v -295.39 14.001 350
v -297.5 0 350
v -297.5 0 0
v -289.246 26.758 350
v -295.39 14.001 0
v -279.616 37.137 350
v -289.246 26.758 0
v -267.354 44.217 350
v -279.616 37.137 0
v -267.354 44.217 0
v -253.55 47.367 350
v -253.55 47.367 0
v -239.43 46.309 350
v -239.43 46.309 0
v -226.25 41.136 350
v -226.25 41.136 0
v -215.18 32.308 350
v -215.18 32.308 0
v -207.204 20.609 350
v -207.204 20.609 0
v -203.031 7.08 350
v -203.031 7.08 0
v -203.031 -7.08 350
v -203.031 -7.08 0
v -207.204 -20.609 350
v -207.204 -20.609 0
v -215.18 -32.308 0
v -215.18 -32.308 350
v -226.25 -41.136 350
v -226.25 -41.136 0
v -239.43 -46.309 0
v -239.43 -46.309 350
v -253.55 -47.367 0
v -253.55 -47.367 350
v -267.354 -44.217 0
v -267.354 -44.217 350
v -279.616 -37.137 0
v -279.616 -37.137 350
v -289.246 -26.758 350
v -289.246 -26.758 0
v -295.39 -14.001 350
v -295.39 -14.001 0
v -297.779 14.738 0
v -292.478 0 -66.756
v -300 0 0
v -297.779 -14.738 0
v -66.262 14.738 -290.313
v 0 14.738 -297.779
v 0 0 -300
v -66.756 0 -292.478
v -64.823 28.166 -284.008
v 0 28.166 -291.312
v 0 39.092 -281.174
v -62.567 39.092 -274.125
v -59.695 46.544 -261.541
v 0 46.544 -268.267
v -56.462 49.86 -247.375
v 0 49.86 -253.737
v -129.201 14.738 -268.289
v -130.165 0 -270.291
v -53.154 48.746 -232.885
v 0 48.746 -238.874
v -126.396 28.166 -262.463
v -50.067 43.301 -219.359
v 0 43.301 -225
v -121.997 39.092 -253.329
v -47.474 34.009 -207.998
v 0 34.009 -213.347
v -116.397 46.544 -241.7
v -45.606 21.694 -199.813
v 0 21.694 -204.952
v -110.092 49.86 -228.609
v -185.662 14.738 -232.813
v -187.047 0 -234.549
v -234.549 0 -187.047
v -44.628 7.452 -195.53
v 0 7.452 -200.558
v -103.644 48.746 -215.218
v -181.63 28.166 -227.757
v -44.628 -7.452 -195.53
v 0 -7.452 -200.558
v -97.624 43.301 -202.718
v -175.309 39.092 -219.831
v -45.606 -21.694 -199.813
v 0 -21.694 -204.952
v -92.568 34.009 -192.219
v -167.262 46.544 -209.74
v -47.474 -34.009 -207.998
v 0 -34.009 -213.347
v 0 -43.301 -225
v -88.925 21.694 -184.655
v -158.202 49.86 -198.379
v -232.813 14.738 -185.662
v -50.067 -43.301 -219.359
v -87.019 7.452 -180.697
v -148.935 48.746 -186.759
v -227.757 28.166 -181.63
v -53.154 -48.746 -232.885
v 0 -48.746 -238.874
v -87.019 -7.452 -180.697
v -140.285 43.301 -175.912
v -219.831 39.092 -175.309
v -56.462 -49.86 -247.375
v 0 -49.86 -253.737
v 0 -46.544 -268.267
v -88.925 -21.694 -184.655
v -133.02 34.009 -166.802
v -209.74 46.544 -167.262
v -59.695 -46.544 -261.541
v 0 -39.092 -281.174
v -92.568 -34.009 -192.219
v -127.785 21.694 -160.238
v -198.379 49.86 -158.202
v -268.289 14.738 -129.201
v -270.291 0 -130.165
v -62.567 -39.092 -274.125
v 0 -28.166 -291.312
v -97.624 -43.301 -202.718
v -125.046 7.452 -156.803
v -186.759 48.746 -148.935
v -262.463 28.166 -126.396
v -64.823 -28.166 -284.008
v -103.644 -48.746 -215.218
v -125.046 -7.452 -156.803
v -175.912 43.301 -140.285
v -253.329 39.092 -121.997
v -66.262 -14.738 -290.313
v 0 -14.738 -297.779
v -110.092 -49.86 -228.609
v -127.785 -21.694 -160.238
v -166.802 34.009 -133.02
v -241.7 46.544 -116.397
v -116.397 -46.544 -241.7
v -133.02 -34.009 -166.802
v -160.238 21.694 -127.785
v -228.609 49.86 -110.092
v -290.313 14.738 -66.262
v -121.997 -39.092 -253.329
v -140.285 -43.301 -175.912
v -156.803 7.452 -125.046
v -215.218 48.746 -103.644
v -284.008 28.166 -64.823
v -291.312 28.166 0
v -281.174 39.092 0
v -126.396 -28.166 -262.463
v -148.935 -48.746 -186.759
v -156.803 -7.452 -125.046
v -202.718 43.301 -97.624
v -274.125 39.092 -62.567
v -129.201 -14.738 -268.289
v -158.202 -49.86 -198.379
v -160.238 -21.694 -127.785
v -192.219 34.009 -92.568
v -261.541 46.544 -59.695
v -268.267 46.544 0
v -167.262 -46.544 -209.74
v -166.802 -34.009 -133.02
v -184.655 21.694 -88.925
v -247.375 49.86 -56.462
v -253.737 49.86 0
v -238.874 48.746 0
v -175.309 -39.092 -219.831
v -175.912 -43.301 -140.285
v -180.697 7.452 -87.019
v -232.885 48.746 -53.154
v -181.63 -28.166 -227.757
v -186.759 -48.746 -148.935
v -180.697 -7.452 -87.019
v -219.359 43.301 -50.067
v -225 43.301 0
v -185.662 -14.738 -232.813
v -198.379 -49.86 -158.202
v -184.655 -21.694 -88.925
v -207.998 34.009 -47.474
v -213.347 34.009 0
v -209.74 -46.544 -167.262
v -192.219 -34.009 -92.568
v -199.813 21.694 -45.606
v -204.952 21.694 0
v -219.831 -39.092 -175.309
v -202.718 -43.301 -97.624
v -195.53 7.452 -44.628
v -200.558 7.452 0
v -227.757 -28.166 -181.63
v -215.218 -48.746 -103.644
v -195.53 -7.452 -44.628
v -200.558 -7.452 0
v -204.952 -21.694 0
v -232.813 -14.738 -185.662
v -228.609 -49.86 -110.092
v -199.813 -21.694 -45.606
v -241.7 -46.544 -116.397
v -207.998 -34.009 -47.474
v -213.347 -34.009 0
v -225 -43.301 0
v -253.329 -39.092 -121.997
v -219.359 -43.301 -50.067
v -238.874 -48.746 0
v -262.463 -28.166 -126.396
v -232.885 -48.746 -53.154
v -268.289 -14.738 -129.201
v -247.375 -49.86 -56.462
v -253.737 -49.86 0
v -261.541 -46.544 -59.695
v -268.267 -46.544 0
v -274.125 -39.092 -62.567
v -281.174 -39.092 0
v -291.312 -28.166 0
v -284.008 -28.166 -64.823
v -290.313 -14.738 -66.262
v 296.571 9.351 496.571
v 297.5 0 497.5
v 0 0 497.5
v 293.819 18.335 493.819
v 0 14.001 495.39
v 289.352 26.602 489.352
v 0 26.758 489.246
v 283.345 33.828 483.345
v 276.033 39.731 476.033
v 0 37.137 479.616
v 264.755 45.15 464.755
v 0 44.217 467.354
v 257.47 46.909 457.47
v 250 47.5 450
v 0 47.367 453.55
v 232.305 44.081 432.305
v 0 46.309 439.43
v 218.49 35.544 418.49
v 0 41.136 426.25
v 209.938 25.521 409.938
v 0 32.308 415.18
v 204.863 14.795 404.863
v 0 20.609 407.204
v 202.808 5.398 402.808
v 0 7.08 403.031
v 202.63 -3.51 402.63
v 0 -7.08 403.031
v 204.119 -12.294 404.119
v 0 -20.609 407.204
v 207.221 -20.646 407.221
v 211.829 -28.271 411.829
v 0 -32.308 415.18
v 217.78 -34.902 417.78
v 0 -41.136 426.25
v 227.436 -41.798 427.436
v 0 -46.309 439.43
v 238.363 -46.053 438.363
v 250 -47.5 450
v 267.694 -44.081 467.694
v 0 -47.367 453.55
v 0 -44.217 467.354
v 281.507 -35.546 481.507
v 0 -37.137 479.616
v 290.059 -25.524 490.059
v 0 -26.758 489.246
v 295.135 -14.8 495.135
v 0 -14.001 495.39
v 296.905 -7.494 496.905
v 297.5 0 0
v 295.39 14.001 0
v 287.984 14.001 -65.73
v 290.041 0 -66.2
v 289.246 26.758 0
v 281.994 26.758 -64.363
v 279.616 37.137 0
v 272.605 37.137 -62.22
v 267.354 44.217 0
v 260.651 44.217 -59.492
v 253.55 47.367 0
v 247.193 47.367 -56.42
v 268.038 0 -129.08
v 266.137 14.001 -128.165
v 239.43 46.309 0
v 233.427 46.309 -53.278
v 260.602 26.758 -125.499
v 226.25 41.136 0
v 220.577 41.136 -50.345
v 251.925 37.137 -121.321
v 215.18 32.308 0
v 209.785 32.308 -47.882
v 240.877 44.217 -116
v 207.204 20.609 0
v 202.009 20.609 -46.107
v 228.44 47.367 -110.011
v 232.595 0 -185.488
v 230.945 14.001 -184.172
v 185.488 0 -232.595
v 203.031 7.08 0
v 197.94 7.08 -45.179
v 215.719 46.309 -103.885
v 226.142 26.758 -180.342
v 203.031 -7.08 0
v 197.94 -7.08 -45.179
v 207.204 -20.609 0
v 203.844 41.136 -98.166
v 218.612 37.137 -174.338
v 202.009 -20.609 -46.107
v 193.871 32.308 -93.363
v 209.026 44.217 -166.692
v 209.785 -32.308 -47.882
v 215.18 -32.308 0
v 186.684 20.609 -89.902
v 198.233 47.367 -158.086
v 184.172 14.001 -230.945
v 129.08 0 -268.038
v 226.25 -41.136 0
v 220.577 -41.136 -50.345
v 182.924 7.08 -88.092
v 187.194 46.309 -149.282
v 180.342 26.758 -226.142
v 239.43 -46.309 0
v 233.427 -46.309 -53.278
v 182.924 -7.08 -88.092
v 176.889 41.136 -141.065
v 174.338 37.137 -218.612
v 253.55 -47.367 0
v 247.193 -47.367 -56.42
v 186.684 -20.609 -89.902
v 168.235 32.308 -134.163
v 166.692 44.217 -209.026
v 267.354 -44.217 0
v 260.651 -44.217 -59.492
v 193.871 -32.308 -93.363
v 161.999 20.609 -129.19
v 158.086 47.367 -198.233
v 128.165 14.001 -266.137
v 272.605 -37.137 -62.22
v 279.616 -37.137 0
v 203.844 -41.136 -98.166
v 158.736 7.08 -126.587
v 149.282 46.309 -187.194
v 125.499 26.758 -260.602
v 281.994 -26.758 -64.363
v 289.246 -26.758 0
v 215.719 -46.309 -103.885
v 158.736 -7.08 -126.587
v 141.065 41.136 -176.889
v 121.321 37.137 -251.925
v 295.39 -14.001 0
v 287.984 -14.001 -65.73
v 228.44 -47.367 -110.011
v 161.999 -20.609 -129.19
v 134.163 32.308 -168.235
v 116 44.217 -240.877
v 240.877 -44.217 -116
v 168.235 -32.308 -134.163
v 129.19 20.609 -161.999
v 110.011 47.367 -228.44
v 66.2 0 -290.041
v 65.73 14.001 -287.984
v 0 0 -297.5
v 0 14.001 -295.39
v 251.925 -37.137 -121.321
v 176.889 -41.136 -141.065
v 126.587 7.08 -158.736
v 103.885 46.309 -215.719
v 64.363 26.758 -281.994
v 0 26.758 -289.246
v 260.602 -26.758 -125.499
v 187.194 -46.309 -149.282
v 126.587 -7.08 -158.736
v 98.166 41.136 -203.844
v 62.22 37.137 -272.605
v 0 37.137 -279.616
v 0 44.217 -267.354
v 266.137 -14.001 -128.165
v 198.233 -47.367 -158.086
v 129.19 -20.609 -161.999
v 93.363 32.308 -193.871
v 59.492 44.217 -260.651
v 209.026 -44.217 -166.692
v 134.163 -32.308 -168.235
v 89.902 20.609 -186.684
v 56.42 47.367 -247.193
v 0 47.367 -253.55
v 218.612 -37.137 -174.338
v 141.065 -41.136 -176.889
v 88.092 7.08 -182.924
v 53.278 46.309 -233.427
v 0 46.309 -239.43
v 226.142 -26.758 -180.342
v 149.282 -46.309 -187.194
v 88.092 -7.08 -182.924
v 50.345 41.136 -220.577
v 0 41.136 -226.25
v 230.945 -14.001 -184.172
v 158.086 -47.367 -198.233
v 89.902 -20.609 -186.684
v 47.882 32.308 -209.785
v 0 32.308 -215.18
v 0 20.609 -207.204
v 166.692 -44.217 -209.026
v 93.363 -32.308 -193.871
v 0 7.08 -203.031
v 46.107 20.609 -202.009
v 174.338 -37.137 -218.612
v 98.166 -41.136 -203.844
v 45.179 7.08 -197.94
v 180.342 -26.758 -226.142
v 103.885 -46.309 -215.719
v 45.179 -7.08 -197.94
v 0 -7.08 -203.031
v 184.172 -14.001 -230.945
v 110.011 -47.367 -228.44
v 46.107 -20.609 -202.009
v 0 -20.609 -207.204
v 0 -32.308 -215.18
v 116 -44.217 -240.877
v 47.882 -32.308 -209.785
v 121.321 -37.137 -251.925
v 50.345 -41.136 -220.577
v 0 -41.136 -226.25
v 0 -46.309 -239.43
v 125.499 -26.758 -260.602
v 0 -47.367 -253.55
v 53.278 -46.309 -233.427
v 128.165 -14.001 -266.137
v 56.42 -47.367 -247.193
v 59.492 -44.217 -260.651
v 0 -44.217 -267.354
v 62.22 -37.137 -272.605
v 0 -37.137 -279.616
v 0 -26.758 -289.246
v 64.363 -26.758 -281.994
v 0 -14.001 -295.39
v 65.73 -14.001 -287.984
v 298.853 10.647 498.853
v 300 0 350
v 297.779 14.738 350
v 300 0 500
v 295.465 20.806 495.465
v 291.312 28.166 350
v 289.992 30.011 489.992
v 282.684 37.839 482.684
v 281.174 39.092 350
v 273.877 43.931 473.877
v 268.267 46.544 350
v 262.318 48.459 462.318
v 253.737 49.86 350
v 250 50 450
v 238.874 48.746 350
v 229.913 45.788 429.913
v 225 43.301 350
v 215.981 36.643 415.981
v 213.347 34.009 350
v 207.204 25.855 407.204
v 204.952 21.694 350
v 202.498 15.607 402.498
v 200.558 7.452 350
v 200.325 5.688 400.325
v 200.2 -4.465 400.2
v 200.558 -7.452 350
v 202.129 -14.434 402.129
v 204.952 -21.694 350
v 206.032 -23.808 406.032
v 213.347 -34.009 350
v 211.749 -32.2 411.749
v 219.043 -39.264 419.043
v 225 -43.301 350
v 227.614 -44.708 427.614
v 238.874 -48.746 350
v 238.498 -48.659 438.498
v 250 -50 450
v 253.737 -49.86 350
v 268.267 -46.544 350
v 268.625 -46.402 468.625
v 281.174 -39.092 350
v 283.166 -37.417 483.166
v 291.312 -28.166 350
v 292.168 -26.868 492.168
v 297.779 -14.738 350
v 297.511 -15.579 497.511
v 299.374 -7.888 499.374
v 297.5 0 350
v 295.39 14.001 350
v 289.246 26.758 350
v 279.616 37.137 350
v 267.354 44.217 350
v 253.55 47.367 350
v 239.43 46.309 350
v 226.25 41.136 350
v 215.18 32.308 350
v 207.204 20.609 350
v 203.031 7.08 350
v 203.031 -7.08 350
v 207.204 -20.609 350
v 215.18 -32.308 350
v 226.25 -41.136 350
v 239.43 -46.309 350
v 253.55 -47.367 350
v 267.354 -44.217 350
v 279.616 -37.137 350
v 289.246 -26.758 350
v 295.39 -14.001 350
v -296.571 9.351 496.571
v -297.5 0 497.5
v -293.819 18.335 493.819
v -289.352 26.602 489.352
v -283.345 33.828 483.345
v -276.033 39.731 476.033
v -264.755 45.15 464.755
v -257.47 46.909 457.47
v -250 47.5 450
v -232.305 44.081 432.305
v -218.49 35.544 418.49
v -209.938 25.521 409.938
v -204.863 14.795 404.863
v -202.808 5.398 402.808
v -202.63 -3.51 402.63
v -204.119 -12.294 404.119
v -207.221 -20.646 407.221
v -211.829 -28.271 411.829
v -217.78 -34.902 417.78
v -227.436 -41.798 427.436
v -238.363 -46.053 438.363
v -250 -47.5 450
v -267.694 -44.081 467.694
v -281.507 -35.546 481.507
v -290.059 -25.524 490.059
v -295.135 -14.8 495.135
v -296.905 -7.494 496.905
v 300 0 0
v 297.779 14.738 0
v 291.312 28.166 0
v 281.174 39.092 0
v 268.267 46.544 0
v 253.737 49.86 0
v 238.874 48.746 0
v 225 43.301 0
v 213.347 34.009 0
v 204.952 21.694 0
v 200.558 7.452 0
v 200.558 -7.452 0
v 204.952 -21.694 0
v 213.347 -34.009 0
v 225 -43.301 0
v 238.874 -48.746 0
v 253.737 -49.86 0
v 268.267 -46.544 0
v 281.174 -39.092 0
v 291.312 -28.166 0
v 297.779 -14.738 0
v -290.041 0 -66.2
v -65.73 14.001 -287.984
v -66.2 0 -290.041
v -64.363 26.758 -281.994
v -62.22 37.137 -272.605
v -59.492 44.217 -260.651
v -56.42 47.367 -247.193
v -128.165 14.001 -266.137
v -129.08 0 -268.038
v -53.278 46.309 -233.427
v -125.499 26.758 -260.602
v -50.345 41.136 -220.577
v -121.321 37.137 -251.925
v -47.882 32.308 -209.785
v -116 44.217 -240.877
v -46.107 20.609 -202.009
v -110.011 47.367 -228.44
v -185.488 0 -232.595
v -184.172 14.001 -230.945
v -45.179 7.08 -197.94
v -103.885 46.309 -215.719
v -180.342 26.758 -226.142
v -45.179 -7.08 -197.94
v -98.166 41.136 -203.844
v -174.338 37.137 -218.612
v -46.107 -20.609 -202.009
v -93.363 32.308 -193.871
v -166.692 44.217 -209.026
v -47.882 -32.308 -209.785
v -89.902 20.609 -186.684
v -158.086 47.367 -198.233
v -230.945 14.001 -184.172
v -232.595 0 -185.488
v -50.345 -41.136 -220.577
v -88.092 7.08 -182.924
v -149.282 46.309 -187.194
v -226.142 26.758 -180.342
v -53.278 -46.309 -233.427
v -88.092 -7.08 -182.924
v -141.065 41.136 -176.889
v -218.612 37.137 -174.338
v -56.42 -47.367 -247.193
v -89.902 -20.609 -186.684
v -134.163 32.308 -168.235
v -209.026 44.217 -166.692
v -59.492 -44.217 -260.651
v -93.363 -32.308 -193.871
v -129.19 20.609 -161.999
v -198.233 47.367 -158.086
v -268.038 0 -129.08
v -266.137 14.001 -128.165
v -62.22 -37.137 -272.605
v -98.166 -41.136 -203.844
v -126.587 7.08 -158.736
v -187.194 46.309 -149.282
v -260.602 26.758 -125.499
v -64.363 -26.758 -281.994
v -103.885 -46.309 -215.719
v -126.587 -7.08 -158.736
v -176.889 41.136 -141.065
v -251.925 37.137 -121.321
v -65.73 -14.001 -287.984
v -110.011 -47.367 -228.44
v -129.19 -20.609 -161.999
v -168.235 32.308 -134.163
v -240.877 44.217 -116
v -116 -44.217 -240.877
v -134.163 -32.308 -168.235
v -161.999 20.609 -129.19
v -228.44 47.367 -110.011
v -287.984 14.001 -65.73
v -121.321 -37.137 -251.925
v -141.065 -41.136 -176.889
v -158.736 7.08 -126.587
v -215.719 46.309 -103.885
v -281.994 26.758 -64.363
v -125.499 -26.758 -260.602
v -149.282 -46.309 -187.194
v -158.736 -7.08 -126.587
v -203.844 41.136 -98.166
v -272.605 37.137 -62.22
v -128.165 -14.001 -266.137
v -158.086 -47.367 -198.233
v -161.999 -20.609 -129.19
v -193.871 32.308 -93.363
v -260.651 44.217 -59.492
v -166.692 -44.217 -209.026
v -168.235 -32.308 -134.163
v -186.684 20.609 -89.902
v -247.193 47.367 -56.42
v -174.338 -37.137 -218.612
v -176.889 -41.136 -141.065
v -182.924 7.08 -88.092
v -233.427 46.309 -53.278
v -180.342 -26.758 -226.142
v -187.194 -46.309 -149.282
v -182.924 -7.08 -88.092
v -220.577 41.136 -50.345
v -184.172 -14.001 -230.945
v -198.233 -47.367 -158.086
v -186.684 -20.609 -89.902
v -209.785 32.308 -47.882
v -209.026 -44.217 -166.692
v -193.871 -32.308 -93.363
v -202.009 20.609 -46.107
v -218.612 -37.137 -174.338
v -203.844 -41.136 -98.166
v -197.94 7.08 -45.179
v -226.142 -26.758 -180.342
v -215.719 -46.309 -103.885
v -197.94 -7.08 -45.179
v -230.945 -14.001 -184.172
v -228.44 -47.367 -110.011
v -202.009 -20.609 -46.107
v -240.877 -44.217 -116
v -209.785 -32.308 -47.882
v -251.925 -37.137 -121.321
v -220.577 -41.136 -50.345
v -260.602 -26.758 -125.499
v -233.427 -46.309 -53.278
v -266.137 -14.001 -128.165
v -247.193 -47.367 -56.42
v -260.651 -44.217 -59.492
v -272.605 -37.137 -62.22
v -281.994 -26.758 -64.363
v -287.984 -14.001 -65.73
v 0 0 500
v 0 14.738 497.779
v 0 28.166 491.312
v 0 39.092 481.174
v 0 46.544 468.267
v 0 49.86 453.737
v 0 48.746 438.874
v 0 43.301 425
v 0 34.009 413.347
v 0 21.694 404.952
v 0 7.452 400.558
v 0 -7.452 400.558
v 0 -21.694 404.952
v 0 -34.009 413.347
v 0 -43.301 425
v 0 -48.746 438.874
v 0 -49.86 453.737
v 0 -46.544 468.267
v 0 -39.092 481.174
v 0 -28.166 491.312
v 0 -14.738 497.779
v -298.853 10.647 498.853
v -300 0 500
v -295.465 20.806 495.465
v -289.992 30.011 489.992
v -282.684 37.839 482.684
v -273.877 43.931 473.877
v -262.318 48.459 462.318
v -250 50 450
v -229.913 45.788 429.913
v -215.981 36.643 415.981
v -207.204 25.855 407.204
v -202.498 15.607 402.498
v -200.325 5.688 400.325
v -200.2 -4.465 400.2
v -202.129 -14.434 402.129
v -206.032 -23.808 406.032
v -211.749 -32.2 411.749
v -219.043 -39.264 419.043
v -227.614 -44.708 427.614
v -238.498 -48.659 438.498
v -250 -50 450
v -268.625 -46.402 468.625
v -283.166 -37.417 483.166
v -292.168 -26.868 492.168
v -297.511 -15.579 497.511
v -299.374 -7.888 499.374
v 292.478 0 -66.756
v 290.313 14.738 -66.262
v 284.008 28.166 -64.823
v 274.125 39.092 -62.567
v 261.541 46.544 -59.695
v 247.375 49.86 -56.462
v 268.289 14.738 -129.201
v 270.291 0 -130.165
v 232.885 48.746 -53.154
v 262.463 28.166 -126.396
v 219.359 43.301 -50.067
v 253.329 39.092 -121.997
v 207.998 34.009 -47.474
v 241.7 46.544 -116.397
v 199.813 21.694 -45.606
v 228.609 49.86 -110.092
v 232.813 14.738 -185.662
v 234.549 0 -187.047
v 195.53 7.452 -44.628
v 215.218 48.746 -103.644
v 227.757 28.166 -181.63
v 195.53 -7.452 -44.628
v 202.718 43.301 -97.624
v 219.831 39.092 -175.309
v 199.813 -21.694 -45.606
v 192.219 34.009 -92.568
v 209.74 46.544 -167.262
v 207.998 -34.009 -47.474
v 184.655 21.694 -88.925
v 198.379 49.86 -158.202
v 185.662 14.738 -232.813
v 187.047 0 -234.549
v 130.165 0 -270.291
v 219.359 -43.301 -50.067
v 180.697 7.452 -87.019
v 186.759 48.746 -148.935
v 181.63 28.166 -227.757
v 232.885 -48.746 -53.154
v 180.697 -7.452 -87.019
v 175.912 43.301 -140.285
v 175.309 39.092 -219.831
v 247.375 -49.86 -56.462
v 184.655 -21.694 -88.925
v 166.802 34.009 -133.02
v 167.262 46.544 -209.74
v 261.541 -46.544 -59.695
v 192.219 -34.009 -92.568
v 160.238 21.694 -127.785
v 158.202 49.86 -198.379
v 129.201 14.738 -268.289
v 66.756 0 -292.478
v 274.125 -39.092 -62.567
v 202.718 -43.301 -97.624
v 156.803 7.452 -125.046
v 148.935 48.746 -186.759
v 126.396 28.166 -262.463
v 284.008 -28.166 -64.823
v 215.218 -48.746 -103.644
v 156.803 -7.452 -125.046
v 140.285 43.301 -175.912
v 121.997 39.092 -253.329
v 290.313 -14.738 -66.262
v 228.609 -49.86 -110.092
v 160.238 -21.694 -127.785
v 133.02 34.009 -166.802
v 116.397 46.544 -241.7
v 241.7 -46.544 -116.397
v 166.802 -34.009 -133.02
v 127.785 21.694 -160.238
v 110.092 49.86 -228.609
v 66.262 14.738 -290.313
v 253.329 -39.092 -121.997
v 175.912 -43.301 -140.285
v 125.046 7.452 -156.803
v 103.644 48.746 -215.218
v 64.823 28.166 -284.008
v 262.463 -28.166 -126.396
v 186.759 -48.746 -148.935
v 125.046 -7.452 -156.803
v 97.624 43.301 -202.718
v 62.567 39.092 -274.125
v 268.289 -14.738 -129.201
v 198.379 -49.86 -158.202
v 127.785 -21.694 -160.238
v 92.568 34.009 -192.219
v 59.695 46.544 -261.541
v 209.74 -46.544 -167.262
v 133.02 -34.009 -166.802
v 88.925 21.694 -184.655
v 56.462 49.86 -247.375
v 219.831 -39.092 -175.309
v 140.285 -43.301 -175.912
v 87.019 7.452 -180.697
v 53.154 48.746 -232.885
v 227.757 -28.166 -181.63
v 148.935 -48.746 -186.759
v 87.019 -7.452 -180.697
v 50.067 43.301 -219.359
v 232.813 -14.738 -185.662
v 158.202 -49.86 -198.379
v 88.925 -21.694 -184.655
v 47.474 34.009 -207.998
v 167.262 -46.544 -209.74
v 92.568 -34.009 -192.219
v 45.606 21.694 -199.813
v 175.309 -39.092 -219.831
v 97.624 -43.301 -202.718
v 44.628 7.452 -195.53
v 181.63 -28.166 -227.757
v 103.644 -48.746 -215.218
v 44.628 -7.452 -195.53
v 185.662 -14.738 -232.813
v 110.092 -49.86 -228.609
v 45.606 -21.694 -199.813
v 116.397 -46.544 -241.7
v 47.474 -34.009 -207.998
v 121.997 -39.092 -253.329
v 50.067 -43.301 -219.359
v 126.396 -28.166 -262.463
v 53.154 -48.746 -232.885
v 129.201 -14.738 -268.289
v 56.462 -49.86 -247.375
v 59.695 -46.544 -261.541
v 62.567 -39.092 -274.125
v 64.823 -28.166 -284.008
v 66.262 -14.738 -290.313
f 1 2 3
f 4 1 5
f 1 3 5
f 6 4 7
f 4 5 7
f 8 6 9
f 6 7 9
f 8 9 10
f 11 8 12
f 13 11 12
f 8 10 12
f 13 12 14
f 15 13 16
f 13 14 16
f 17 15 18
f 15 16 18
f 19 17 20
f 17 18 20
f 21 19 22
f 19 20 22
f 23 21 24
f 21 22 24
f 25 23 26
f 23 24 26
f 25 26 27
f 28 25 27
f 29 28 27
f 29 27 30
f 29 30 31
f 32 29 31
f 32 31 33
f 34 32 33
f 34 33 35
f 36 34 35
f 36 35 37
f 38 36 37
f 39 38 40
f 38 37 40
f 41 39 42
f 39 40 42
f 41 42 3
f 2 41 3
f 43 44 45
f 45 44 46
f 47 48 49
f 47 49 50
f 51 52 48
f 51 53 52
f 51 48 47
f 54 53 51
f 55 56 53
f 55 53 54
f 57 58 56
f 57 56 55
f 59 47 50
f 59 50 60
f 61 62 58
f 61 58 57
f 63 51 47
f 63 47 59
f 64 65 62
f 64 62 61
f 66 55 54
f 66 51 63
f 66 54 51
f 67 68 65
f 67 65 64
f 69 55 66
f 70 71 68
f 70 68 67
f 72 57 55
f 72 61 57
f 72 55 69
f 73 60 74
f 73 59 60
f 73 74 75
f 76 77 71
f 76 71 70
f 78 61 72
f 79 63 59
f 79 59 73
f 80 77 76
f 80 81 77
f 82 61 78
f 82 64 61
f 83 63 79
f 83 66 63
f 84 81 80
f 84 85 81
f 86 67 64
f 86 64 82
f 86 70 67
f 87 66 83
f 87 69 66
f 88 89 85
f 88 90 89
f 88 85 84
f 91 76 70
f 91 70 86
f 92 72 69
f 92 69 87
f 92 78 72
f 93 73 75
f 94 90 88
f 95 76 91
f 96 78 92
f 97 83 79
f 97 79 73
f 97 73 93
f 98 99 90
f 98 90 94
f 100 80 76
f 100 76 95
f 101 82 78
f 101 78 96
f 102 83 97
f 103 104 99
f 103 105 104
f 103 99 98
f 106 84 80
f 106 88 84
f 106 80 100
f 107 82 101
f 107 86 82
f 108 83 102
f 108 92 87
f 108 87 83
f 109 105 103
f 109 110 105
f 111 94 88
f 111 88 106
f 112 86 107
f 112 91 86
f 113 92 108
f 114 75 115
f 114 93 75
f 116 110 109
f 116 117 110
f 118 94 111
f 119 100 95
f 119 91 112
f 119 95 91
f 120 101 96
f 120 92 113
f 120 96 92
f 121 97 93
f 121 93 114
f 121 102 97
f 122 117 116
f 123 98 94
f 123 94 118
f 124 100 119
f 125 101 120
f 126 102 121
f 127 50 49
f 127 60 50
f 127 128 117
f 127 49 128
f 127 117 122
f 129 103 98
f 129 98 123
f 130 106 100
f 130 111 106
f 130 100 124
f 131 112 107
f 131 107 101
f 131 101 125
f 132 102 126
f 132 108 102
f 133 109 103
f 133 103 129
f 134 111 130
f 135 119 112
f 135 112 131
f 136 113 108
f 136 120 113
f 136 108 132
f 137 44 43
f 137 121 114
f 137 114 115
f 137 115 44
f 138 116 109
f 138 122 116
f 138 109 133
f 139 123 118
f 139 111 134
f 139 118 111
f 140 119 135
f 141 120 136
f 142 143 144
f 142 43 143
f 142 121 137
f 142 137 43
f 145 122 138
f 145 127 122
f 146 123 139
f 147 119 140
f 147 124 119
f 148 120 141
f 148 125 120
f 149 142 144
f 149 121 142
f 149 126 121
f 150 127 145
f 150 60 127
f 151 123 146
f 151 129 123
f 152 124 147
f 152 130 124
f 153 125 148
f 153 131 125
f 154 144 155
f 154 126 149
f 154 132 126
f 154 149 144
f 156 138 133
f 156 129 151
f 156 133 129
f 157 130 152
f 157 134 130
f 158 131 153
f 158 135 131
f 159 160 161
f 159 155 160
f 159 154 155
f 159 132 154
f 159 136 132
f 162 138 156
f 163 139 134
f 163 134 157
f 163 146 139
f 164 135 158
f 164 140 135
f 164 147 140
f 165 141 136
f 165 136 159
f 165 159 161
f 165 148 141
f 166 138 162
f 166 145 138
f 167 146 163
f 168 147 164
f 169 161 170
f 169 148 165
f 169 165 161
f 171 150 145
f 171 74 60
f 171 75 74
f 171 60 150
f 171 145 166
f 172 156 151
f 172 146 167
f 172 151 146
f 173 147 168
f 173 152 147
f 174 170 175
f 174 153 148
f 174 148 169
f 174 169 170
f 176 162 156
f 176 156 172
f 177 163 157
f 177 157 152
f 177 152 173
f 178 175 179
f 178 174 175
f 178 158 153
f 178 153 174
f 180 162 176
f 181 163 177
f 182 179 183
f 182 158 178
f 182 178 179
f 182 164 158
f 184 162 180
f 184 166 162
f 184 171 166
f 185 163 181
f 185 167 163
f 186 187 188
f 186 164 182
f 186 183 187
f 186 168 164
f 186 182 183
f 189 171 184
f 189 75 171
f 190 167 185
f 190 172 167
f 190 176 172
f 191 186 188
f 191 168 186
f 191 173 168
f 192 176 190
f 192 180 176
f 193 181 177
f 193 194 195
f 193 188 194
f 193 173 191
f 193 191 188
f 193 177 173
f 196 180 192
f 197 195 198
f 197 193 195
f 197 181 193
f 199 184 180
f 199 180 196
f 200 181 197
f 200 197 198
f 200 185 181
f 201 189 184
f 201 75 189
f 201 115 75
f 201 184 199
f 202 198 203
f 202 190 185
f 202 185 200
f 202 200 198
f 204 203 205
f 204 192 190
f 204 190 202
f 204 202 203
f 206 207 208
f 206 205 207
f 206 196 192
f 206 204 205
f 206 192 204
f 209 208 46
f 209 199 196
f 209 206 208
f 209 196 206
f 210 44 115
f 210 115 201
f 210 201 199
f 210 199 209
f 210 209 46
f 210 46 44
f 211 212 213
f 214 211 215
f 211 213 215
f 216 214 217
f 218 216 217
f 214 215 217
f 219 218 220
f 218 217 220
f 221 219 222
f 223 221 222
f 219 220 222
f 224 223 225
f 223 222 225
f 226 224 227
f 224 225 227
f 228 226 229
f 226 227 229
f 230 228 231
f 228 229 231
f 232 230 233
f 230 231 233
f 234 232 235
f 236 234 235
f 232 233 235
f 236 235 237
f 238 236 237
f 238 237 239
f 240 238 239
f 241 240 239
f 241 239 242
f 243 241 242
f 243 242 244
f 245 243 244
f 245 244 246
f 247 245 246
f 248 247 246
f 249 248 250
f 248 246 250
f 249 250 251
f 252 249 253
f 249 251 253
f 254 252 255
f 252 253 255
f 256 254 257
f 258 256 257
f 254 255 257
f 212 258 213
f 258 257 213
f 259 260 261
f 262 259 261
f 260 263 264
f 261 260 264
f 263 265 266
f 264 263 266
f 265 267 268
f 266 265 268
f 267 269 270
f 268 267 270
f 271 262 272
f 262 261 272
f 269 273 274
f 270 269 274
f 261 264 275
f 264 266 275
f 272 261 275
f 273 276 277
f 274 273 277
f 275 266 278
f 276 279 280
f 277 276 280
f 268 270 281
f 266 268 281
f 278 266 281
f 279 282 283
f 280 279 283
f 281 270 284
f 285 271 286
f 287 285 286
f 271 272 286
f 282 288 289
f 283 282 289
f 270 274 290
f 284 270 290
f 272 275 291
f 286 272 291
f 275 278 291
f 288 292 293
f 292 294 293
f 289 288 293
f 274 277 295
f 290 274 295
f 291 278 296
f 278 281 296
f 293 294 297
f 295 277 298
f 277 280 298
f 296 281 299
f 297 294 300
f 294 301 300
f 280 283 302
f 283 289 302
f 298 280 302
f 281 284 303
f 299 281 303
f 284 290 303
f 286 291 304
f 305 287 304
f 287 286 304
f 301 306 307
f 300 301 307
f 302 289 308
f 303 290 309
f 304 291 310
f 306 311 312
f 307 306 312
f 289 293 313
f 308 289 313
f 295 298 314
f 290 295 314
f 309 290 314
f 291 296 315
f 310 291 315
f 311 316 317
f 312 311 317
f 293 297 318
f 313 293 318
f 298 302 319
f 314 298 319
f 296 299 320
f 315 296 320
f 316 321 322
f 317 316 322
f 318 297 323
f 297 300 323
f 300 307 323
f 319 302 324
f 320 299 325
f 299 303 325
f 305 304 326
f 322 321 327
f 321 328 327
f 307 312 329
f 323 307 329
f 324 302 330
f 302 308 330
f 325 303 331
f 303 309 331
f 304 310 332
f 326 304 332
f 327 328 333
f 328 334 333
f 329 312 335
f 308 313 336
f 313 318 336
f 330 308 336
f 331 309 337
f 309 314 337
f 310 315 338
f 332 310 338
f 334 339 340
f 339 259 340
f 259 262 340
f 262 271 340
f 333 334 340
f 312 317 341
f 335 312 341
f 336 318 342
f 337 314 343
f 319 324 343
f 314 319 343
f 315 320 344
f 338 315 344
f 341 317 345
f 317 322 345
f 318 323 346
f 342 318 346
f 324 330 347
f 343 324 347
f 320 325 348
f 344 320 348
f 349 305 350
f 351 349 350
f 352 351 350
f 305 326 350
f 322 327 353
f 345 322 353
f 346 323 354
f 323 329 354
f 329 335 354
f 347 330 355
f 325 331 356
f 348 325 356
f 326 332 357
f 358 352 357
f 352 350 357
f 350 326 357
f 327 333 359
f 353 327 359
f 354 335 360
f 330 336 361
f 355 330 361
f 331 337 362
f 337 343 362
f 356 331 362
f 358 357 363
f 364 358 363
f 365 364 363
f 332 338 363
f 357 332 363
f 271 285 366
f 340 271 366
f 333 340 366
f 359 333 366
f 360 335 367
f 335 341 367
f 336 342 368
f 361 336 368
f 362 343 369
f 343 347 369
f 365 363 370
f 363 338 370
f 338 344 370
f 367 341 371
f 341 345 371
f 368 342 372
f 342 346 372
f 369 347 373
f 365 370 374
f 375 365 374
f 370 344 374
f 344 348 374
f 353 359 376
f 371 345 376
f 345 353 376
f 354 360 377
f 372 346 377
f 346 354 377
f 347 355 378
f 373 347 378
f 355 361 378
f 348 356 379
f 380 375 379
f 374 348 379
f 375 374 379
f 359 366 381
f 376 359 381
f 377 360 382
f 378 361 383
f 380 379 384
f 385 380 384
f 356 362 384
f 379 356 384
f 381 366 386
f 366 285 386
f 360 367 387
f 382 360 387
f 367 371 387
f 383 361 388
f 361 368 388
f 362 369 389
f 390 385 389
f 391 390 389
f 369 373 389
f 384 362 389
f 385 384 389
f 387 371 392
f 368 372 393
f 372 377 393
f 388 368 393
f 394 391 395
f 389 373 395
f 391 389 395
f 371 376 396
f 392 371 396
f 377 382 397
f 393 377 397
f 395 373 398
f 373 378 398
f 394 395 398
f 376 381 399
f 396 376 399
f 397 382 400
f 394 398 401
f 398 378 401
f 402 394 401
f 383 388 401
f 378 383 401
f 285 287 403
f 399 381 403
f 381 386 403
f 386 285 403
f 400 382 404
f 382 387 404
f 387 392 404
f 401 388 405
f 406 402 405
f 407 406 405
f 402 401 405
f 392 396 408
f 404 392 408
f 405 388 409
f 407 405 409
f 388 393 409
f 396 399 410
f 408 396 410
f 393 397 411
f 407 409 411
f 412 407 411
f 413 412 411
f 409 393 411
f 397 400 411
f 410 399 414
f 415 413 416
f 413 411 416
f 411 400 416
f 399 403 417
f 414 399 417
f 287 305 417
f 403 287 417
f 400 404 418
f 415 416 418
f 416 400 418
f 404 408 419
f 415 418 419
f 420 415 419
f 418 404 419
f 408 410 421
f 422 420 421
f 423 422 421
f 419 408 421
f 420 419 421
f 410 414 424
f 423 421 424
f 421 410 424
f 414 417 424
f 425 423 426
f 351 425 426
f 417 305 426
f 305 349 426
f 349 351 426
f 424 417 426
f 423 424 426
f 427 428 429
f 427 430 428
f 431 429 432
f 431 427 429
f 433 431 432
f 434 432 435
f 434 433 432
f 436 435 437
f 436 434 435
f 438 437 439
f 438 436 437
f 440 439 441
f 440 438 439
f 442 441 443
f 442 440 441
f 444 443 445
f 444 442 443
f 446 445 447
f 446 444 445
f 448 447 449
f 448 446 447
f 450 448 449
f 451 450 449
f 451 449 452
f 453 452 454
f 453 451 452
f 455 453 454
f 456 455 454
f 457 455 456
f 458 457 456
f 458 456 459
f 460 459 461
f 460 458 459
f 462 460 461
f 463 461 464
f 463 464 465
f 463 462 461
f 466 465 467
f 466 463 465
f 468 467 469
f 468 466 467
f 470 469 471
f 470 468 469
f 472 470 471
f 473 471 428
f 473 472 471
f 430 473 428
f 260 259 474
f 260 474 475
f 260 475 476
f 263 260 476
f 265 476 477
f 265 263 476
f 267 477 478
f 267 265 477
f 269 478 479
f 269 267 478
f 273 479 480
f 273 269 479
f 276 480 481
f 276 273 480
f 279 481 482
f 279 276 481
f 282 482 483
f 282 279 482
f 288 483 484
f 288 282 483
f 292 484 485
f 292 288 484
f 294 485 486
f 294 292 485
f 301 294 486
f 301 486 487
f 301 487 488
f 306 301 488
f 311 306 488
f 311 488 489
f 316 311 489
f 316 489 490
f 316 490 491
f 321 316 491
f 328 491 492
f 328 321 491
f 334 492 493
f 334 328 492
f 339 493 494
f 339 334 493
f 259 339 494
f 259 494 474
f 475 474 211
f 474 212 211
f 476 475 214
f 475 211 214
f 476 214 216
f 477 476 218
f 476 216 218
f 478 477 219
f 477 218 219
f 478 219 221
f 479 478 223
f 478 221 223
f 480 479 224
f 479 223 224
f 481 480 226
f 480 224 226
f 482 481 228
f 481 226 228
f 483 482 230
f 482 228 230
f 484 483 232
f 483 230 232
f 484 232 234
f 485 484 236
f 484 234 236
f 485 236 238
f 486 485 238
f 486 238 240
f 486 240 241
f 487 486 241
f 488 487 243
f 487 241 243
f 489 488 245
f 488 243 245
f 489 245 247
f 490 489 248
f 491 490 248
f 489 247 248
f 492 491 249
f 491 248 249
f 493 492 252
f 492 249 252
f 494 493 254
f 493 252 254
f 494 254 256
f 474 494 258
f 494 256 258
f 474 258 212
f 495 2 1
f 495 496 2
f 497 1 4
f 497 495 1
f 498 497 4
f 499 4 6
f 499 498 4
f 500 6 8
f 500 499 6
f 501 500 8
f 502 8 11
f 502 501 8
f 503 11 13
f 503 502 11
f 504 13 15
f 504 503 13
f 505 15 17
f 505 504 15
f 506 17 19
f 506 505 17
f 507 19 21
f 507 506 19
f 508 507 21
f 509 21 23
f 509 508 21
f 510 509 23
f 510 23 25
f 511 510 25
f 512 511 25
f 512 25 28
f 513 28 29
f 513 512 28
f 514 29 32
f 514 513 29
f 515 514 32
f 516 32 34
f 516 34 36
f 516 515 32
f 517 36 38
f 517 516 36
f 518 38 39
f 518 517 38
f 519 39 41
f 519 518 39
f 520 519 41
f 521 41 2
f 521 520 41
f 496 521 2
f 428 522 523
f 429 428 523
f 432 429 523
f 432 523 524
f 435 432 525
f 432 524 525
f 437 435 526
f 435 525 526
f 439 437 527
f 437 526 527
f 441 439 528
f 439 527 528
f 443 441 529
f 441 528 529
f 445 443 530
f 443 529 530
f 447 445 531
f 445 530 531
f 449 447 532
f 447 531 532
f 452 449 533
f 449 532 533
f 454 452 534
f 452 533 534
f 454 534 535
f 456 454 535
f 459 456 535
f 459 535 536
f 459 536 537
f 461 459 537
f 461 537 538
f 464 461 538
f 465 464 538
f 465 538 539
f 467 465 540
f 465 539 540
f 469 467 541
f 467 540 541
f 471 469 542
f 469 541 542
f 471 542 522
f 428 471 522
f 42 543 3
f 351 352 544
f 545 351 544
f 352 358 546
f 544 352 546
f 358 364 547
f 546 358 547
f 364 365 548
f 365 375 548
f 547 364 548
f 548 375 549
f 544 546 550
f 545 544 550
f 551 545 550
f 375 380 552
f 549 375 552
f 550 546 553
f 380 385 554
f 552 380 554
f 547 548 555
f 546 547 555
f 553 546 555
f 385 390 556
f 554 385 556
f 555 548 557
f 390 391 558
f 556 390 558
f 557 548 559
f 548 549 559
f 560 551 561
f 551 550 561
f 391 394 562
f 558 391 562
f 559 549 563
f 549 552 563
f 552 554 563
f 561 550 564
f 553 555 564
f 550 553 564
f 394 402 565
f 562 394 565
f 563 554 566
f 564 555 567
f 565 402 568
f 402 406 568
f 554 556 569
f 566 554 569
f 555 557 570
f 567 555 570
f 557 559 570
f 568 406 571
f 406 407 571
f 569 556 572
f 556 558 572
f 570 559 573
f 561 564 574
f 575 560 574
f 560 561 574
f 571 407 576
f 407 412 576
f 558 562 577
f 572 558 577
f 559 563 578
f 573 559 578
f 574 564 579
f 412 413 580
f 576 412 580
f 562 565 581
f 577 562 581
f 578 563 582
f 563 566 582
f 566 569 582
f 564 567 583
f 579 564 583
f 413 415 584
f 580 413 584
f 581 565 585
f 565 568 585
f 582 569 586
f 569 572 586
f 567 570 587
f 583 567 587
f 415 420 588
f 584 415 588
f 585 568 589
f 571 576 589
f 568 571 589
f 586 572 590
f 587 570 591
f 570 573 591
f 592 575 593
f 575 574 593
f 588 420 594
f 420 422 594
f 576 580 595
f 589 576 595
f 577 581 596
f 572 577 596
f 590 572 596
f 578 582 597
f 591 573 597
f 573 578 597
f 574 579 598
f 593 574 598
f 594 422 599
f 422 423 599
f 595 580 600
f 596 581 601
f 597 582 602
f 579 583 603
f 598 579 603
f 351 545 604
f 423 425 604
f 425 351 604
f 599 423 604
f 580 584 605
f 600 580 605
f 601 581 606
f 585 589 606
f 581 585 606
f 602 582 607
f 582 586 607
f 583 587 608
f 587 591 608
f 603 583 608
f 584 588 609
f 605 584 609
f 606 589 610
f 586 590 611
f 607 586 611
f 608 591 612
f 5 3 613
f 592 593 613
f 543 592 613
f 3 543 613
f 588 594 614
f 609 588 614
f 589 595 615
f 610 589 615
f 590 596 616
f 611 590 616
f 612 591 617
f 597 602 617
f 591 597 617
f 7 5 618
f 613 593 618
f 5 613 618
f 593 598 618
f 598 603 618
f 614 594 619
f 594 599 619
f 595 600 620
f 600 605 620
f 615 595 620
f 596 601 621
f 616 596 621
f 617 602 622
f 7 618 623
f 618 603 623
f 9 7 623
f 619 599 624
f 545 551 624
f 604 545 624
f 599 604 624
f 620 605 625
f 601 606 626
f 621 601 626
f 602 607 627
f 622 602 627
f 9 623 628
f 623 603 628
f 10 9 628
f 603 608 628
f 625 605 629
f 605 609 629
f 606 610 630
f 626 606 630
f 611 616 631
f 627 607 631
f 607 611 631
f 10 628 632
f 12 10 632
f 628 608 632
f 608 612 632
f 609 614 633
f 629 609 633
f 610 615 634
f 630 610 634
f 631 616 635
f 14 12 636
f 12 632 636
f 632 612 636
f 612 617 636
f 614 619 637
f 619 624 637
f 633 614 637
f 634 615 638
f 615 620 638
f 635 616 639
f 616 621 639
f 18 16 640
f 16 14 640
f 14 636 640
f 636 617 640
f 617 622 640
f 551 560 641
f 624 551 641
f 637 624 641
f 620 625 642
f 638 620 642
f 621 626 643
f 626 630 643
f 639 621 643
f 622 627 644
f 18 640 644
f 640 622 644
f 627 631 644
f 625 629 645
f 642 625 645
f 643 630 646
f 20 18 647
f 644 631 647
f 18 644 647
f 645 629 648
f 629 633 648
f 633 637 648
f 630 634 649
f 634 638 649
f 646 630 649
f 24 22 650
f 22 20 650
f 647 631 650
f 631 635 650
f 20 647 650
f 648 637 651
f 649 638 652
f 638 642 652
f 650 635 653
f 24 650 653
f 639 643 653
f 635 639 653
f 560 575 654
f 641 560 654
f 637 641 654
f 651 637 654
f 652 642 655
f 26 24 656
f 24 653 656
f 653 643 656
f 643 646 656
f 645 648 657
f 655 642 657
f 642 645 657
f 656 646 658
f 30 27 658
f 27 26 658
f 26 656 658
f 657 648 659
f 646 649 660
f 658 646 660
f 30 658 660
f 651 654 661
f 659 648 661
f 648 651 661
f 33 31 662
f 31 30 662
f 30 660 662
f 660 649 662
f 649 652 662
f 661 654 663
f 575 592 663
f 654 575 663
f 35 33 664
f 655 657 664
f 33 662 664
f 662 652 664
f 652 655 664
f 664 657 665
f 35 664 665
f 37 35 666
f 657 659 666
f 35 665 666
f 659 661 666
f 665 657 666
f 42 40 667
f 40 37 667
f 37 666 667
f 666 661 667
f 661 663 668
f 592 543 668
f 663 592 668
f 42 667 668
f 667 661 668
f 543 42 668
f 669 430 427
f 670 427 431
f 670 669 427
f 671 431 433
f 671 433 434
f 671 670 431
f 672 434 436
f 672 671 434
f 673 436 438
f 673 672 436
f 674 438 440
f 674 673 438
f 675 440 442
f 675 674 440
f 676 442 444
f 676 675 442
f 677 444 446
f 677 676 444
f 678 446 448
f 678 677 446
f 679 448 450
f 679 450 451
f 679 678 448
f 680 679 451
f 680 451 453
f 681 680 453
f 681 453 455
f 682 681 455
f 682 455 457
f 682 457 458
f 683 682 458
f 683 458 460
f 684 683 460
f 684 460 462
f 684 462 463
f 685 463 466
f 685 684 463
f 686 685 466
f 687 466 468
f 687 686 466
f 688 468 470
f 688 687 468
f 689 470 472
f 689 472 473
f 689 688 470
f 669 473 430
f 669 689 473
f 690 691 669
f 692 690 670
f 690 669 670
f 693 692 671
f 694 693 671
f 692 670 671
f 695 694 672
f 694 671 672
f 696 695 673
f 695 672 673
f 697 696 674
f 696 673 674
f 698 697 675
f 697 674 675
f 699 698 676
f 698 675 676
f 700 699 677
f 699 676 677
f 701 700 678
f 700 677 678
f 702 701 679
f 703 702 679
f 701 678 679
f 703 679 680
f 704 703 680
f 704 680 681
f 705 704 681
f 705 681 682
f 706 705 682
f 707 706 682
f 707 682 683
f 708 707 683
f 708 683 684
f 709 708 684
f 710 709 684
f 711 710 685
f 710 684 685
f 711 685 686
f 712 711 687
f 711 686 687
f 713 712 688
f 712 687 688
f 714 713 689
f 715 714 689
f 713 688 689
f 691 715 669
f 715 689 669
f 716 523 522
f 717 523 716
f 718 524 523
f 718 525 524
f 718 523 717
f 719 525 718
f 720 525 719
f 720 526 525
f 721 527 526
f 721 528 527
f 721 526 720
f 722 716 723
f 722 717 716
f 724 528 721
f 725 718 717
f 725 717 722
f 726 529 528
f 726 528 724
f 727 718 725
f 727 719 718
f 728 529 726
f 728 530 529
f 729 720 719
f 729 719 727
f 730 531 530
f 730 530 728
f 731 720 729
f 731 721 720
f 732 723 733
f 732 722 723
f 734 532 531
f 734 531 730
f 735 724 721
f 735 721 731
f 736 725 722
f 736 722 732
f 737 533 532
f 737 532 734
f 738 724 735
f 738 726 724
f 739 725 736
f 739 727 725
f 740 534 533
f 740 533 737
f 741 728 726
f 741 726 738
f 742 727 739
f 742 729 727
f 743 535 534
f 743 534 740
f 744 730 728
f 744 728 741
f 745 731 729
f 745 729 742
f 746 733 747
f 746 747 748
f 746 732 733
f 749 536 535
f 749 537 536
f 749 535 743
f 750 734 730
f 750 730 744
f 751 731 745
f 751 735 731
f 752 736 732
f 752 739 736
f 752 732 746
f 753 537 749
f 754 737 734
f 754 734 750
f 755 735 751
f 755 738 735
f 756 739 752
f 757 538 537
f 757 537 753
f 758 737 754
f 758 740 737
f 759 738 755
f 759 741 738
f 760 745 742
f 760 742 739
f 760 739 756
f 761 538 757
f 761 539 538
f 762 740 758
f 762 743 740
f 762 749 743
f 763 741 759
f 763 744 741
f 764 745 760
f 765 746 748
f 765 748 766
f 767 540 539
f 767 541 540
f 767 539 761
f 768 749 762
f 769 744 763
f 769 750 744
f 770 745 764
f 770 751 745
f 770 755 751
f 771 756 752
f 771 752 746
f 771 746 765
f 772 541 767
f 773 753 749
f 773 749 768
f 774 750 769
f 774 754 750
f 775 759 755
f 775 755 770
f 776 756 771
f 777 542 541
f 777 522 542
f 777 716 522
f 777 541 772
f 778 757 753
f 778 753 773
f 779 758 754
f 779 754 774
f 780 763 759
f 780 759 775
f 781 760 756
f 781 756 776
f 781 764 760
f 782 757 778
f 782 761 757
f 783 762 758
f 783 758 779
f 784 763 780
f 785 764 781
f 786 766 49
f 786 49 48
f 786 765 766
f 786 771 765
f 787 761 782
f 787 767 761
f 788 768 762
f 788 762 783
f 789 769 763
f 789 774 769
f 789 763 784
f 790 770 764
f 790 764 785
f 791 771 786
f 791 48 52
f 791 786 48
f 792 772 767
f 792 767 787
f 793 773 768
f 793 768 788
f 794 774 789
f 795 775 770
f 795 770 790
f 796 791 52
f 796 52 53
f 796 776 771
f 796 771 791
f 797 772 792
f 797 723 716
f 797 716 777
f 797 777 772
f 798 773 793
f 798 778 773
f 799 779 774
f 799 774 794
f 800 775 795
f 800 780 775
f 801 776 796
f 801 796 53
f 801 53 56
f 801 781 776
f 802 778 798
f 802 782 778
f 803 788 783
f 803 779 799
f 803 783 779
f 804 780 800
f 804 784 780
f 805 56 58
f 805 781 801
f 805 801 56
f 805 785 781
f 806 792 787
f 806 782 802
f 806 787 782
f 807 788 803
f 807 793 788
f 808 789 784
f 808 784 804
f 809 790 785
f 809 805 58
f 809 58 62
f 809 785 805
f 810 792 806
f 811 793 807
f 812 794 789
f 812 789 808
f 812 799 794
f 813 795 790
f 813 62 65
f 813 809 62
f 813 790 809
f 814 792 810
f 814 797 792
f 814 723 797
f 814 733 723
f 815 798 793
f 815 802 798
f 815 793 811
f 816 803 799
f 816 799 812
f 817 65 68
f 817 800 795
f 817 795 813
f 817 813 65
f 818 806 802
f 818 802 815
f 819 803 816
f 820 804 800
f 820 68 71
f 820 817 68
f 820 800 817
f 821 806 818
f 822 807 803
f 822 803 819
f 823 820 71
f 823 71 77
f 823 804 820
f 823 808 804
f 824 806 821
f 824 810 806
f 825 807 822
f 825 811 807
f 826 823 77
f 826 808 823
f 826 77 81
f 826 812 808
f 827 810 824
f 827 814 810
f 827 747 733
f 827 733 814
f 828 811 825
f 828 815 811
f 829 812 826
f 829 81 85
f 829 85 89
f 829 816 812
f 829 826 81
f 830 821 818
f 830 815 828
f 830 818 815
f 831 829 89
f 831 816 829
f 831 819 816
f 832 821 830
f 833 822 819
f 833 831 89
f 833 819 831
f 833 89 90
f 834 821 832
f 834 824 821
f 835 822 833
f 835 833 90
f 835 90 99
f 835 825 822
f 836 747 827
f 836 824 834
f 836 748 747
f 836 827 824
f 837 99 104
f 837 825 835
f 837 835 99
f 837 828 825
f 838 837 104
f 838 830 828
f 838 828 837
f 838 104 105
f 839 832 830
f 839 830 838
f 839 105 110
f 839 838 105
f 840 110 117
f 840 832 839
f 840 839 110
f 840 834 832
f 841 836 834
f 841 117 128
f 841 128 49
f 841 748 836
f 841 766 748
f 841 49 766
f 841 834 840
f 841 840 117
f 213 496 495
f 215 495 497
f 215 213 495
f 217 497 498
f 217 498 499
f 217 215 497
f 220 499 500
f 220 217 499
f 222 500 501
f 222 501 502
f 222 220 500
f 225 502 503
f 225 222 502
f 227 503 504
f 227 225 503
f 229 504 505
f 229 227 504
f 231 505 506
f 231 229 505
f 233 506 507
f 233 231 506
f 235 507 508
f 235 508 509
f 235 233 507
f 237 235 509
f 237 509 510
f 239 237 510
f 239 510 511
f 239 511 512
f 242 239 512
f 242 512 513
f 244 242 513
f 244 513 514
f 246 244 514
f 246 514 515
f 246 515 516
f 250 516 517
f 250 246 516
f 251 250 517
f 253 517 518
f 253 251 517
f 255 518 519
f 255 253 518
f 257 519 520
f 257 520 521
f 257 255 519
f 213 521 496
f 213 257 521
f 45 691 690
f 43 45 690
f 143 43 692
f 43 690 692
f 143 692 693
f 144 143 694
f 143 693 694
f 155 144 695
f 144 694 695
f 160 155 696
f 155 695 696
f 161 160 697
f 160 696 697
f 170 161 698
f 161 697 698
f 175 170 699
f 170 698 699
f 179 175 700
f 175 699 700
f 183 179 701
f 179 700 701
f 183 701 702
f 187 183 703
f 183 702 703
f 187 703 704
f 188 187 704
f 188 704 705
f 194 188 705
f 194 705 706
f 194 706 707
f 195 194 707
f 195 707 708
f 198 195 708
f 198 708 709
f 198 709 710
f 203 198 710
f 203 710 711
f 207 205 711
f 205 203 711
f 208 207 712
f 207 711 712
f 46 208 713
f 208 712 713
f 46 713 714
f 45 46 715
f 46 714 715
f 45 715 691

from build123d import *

# Parameters (mm, degrees)
SKETCH_1_R          = 50
SKETCH_1_R_2        = 47.5
CUT_EXTRUDE_1_DEPTH = 150
SKETCH_3_R          = 50
SKETCH_3_R_2        = 47.5
EXTRUDE_1_DEPTH     = 350
SKETCH_5_R          = 50
SKETCH_5_R_2        = 47.5


with BuildPart() as part:
    # 草图1 → 旋转1 (revolve)
    with BuildSketch(Plane.XY, mode=Mode.PRIVATE) as revolve_1_sk:
        with Locations((250, 0)):
            Circle(SKETCH_1_R)
        with Locations((250, 0)):
            Circle(SKETCH_1_R_2, mode=Mode.SUBTRACT)
    revolve(revolve_1_sk.sketch.rotate(Axis((0, 0, 0), (0, 1, 0)), 90), axis=Axis((0, 0, 0), (0, 1, 0)))

    # 草图2 → 切除-拉伸1 (cut, symmetric)
    with BuildSketch(Plane(origin=(0, 0, 0), x_dir=(1, 0, 0), z_dir=(0, 1, 0))):
        Polygon((-384.261644324, 0), (443.109902211, 0), (321.917450325, -325.996042455), (-266.565128549, -318.421514212), align=None)
    extrude(amount=CUT_EXTRUDE_1_DEPTH, both=True, mode=Mode.SUBTRACT)

    # 草图3 → 凸台-拉伸1 (add)
    with BuildSketch(Plane.XY):
        with Locations((250, 0)):
            Circle(SKETCH_3_R)
        with Locations((250, 0)):
            Circle(SKETCH_3_R_2, mode=Mode.SUBTRACT)
    extrude_1 = extrude(amount=EXTRUDE_1_DEPTH)

    # 镜向1: 凸台-拉伸1 across plane
    add(extrude_1.mirror(Plane(origin=(0, 0, 0), x_dir=(0, 0, 1), z_dir=(1, 0, 0))))

    # 扫描1: sweep along a path in 草图4
    with BuildLine(Plane(origin=(0, 0, 0), x_dir=(1, 0, 0), z_dir=(0, 1, 0))) as sweep_1_path:
        Line((250, -350), (250, -450))
        Line((250, -450), (0, -450))
    # 草图5 → 扫描1 (sweep)
    with BuildSketch(Plane.XY.offset(350)):
        with Locations((250, 0)):
            Circle(SKETCH_5_R)
        with Locations((250, 0)):
            Circle(SKETCH_5_R_2, mode=Mode.SUBTRACT)
    sweep_1 = sweep(path=sweep_1_path.line, transition=Transition.RIGHT)

    # 镜向2: 扫描1 across plane
    add(sweep_1.mirror(Plane(origin=(0, 0, 0), x_dir=(0, 0, 1), z_dir=(1, 0, 0))))


solid = part.part
